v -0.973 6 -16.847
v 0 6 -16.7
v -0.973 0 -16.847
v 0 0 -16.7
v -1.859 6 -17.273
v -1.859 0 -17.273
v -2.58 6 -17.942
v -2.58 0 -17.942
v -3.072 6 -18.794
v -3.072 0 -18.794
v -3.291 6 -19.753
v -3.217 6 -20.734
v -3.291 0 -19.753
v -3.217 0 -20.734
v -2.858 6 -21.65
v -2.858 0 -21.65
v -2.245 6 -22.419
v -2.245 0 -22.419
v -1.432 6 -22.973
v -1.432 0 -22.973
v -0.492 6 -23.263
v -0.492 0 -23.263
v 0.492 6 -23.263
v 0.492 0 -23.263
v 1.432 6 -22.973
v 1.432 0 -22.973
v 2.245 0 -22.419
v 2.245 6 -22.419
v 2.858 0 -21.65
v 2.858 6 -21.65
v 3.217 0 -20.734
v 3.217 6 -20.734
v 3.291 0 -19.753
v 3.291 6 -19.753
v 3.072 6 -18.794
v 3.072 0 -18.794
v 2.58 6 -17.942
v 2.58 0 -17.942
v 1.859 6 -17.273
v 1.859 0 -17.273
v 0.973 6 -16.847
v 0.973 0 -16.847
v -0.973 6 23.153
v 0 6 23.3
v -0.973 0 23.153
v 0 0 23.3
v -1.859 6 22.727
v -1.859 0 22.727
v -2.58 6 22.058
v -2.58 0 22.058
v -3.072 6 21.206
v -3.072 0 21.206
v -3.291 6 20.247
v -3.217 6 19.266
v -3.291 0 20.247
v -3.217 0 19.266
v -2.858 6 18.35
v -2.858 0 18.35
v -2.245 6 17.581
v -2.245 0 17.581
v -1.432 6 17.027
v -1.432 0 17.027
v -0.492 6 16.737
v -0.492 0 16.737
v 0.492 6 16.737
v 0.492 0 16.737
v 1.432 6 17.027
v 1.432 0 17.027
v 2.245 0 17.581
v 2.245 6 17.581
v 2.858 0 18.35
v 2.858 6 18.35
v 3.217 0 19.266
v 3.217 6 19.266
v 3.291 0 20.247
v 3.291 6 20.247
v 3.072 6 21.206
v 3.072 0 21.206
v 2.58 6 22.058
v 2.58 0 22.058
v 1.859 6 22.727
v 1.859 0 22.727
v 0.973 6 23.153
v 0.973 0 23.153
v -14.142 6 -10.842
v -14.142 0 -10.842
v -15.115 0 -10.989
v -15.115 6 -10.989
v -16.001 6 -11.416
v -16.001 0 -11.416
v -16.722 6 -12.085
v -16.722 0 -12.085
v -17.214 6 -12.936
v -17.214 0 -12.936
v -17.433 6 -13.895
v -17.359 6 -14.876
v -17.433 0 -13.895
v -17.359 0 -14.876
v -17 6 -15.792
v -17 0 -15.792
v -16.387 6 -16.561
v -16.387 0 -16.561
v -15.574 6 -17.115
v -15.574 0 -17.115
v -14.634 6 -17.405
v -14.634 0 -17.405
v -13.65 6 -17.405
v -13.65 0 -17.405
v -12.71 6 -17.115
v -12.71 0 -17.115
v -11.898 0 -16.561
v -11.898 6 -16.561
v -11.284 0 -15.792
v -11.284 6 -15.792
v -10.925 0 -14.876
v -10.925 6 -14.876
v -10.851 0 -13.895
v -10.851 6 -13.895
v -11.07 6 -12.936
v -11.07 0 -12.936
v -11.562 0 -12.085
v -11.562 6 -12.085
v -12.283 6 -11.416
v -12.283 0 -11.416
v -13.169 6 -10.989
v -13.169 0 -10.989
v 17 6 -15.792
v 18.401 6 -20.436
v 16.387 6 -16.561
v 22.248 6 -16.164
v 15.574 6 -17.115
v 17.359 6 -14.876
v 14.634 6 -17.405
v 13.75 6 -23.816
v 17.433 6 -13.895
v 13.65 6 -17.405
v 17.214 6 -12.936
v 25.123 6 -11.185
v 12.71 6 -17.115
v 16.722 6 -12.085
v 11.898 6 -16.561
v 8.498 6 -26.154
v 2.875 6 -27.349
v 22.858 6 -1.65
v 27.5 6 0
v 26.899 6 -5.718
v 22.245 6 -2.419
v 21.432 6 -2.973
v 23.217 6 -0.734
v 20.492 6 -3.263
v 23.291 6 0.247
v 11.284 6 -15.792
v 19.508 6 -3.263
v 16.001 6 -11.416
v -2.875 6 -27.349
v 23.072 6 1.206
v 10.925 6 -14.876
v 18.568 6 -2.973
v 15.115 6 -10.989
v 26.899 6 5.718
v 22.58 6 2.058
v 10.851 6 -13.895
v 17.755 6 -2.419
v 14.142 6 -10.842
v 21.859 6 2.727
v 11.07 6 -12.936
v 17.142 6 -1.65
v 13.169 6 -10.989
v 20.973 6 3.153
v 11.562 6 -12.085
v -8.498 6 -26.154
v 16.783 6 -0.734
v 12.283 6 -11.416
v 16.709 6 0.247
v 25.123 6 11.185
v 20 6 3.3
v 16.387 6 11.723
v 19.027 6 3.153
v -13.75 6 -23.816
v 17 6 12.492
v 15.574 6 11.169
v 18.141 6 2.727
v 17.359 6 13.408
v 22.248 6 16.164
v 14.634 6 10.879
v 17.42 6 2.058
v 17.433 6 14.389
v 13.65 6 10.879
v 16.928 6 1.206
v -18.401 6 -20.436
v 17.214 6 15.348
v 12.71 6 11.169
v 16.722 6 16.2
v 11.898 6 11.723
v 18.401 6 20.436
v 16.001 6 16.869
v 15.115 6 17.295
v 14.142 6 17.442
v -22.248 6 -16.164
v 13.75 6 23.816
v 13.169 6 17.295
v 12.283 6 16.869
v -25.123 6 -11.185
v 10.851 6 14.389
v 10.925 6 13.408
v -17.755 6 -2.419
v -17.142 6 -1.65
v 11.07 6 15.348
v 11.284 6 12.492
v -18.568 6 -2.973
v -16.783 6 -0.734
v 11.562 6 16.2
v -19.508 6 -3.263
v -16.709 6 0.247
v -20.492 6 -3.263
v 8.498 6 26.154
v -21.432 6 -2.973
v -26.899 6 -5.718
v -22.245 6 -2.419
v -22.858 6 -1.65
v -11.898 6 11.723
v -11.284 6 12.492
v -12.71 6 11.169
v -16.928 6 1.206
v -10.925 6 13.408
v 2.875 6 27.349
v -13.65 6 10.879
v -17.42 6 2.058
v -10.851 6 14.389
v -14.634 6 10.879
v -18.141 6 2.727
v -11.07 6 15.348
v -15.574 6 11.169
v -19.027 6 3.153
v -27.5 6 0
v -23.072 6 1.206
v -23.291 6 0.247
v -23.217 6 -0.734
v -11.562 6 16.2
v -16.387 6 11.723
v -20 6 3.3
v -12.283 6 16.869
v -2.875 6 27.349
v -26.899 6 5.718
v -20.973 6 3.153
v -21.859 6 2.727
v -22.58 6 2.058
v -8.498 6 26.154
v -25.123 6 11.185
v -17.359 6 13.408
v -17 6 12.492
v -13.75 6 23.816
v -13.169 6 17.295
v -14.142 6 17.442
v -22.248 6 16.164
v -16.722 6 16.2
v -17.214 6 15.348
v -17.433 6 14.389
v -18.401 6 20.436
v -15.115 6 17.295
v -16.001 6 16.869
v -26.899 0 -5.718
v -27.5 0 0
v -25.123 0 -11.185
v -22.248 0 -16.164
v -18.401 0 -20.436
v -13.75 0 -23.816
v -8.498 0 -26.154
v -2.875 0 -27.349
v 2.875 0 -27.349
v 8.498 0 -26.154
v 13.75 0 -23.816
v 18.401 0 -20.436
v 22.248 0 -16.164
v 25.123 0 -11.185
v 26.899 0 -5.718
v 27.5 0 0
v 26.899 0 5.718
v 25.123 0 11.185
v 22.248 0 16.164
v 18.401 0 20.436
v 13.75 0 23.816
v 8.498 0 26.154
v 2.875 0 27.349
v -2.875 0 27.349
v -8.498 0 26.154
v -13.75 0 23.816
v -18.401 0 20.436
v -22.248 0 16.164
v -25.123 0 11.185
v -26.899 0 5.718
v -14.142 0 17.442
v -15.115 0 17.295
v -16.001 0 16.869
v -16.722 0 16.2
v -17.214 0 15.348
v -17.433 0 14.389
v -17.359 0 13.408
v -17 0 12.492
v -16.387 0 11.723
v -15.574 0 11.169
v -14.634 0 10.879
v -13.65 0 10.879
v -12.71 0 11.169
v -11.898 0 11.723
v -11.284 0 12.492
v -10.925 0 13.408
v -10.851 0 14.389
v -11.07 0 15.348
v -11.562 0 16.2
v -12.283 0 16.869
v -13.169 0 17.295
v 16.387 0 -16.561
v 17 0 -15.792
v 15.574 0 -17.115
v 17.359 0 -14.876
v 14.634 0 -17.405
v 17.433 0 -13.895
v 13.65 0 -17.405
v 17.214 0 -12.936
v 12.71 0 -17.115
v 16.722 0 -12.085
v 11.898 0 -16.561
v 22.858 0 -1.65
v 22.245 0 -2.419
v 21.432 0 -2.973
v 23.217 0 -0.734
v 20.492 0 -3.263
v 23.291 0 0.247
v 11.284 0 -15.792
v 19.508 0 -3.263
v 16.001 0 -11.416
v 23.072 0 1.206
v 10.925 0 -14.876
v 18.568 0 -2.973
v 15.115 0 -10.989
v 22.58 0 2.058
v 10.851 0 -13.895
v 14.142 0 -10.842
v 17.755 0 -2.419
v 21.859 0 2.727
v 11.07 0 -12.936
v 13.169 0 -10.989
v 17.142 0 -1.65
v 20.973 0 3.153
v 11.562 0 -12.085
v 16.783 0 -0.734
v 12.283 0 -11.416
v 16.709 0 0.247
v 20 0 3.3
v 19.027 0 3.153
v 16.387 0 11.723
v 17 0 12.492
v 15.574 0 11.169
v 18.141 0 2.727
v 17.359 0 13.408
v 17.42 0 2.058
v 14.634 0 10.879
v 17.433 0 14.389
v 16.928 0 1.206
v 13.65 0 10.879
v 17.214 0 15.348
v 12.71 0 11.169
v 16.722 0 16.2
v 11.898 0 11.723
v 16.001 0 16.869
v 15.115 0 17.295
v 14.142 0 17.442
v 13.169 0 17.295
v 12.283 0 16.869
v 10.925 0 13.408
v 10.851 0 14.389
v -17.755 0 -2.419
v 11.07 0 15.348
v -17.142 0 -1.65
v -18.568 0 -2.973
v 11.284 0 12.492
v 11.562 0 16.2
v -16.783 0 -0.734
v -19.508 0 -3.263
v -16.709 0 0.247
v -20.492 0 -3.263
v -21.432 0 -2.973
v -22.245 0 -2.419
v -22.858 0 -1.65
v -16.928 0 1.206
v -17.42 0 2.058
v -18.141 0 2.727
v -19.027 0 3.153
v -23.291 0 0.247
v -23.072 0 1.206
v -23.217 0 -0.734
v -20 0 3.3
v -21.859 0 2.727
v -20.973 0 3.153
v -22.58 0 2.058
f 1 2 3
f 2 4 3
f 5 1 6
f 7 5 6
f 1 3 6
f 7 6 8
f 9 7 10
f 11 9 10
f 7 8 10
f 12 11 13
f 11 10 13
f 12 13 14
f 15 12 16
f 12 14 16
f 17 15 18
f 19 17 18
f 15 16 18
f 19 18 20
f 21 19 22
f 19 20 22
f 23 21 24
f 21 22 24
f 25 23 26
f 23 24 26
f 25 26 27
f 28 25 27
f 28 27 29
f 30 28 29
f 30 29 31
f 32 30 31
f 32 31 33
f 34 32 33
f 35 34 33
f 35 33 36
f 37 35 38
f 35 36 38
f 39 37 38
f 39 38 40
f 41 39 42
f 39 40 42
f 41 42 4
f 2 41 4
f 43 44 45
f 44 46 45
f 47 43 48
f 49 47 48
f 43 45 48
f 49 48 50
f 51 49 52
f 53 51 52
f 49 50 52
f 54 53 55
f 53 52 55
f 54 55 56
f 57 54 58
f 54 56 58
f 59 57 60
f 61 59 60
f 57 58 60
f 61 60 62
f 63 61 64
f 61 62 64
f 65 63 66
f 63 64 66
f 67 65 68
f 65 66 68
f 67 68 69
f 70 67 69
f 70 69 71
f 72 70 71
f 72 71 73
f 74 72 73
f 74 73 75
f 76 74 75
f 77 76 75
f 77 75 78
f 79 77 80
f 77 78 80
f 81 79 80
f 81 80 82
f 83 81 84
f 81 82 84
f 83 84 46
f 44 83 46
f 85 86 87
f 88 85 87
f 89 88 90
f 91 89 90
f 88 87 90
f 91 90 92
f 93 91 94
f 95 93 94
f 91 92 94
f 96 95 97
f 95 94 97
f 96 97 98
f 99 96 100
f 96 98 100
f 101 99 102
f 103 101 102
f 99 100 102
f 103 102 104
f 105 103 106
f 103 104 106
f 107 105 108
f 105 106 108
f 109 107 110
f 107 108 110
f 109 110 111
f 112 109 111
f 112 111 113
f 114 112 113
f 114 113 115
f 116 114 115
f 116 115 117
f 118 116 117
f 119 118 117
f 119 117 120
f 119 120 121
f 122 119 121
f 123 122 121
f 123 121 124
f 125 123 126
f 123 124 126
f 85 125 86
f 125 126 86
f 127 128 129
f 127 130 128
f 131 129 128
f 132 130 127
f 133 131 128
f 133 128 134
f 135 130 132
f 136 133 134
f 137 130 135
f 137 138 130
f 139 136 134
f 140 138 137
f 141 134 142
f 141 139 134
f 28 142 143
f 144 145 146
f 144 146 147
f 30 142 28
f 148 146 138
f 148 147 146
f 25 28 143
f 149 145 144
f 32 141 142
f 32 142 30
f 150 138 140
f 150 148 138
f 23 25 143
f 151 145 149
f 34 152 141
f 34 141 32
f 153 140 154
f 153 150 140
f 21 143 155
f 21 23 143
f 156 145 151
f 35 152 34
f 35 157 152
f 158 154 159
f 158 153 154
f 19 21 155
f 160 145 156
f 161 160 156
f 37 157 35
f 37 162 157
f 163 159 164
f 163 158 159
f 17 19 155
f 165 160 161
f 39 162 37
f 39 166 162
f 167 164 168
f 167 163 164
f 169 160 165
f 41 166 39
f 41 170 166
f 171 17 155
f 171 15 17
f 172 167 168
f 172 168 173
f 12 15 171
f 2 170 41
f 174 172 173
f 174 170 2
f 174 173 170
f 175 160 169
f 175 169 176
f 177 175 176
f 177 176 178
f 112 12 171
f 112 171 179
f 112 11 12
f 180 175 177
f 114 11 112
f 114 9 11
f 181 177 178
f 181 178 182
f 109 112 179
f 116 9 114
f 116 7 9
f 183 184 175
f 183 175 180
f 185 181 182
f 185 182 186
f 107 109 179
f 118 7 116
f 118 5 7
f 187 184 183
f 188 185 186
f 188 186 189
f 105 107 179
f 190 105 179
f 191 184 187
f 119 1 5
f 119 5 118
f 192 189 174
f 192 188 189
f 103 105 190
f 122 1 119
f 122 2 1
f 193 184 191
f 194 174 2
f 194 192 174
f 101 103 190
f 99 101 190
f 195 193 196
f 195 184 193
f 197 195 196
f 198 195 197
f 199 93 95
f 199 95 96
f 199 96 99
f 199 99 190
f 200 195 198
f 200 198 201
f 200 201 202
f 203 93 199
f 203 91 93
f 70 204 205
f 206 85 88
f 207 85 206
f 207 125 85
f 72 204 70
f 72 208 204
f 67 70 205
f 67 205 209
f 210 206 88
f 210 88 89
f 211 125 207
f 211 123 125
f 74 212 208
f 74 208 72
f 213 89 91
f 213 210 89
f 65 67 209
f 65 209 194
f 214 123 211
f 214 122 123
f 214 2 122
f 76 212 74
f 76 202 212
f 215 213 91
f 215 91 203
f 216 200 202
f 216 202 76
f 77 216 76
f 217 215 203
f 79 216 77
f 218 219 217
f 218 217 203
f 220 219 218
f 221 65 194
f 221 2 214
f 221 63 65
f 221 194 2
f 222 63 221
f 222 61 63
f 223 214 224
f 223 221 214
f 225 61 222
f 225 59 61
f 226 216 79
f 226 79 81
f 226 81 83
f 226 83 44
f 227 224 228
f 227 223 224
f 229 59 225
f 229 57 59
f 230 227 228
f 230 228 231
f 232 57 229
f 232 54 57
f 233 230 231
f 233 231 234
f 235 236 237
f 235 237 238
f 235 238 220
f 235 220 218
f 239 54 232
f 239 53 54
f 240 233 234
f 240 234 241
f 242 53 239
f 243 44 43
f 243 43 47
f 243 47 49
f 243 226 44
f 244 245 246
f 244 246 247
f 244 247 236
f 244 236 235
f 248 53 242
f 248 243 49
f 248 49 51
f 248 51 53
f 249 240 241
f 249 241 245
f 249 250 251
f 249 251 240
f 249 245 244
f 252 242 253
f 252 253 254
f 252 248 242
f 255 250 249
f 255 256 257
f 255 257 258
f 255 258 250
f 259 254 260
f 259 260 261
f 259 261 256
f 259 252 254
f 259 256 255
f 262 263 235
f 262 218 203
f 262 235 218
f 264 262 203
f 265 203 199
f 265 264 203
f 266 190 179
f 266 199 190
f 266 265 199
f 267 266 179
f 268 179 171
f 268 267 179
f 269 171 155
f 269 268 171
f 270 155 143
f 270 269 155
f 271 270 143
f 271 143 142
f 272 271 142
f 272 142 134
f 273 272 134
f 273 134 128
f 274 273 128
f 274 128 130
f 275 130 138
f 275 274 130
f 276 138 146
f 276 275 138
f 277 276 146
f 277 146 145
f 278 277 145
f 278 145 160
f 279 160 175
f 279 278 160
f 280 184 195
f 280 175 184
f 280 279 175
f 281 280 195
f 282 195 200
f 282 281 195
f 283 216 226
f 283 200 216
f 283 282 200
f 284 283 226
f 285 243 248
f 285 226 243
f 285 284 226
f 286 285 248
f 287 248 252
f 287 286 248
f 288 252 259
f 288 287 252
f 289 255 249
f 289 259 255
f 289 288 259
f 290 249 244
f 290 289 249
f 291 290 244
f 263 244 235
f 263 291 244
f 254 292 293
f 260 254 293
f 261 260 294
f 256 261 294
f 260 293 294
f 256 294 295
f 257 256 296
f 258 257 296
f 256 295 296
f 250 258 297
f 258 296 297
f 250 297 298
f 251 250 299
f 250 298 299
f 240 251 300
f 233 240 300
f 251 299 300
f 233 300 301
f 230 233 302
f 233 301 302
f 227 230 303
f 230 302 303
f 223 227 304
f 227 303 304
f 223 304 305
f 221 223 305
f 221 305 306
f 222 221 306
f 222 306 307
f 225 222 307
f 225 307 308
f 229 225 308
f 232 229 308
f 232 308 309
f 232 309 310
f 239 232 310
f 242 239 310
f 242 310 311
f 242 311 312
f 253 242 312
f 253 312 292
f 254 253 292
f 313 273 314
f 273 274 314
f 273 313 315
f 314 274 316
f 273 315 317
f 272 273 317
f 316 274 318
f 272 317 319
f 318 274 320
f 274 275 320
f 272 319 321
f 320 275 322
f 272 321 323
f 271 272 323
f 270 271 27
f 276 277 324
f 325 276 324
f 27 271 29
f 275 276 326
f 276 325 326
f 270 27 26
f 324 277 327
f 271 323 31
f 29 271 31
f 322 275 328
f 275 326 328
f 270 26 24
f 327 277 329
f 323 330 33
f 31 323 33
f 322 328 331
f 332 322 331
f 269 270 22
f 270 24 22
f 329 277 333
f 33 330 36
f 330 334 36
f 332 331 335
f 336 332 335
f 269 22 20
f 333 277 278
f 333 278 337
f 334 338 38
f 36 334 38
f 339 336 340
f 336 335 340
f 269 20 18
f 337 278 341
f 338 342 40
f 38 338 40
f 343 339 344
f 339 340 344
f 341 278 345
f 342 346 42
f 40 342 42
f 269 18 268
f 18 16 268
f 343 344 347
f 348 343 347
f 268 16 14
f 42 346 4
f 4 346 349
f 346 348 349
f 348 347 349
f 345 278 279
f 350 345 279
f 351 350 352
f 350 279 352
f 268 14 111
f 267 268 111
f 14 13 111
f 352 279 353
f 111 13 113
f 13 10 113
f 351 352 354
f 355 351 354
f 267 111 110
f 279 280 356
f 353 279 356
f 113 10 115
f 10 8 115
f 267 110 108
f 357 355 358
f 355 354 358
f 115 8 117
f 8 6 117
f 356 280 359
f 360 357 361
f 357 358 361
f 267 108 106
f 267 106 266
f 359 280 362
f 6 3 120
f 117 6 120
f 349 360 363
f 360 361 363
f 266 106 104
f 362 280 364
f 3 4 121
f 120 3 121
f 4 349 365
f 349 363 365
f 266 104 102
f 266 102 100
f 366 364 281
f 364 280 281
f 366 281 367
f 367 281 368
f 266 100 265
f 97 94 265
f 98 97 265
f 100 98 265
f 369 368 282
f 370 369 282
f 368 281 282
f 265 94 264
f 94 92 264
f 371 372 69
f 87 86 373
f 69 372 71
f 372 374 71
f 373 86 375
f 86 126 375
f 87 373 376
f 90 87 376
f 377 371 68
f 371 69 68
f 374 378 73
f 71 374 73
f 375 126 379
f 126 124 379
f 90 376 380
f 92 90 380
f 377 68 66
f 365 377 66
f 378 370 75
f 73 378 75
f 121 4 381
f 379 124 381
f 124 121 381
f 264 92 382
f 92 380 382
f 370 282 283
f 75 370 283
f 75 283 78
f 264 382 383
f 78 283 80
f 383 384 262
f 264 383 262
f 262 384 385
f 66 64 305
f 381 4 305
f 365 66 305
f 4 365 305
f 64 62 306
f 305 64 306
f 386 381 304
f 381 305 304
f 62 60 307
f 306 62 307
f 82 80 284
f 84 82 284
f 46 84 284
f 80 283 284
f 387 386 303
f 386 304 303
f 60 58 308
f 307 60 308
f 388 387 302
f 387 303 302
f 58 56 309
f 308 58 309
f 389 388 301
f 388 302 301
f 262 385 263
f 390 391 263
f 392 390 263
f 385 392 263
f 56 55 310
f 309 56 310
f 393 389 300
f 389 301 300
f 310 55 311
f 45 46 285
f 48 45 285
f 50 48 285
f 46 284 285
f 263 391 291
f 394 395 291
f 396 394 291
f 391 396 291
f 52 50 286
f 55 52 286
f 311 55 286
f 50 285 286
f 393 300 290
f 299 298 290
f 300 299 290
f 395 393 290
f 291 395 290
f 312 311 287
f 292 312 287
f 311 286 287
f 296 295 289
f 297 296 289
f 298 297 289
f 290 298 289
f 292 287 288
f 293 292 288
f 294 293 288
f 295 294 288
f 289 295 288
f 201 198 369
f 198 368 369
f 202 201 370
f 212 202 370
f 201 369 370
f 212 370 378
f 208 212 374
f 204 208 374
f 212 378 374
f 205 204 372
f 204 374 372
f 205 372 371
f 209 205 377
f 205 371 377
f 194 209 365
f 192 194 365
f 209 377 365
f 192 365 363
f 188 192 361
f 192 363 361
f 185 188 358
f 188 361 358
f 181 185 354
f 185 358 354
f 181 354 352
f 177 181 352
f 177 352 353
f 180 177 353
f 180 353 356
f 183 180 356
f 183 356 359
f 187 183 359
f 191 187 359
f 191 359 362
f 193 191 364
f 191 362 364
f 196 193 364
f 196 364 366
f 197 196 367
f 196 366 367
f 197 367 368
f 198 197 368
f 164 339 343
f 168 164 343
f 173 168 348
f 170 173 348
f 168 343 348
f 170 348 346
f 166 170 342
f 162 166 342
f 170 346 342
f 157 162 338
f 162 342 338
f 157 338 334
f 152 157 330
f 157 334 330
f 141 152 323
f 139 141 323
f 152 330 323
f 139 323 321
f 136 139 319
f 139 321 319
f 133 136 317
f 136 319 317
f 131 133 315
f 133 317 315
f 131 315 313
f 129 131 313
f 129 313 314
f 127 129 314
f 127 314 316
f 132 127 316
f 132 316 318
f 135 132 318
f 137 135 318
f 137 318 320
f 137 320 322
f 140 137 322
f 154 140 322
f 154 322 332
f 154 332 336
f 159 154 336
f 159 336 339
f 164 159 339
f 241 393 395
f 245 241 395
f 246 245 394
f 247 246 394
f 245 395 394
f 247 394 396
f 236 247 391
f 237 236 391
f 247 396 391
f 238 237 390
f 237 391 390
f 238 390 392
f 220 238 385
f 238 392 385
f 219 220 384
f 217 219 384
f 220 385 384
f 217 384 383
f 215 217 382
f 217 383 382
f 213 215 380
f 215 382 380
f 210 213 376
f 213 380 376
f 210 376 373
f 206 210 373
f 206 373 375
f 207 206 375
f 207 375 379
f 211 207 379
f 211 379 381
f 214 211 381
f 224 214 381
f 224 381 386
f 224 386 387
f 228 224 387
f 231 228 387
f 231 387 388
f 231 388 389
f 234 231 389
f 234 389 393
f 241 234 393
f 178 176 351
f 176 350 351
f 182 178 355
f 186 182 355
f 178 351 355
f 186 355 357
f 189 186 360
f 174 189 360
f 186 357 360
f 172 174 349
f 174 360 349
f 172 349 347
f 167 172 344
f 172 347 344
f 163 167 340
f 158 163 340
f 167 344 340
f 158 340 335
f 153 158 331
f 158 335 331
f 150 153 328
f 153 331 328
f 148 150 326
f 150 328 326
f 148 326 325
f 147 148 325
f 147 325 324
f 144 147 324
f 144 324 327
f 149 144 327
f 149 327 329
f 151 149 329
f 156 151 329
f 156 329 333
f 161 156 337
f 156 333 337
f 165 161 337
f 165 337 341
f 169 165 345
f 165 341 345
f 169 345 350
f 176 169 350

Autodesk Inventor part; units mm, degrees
ref_plane "YZ Plane" through (0, 0, 0) normal (1, 0, 0) x (0, 1, 0)
ref_plane "XZ Plane" through (0, 0, 0) normal (0, 1, 0) x (-1, 0, 0)
ref_plane "XY Plane" through (0, 0, 0) normal (0, 0, 1) x (1, 0, 0)
sketch "Sketch1" plane through (0, 0, 0) normal (0, 1, 0) x (-1, 0, 0)
  circle A0 centre (0, 0) radius 27.5
  dimension "d0" = 55
extrude "Extrusion1" add sketch "Sketch1" along normal blind 6
sketch "Sketch2" plane through (0, 6, 0) normal (0, 1, 0) x (1, 0, 0)
  circle A0 centre (0, 0) radius 27.5 projected
  point P0 (20, 0)
  point P1 (14.1421, 14.1421)
  point P2 (0, 20)
  point P3 (-14.1421, 14.1421)
  point P4 (-20, 0)
  point P5 (-14.1421, -14.1421)
  point P6 (0, -20)
  point P7 (14.1421, -14.1421)
  dimension "d3" = 20
  dimension "d6" = 360
hole "Hole1" at (20, 6, 0) at (14.1421, 6, -14.1421) at (0, 6, -20) at (-14.1421, 6, -14.1421) at (-20, 6, 0) at (-14.1421, 6, 14.1421) at (0, 6, 20) at (14.1421, 6, 14.1421) direction (0, -1, 0) diameter 6.6 depth 8 tip angle 118 clearance for "Flat Head Machine Screw" size "M6" standard "Ansi Metric M Profile"
properties part number "simple_plate"
